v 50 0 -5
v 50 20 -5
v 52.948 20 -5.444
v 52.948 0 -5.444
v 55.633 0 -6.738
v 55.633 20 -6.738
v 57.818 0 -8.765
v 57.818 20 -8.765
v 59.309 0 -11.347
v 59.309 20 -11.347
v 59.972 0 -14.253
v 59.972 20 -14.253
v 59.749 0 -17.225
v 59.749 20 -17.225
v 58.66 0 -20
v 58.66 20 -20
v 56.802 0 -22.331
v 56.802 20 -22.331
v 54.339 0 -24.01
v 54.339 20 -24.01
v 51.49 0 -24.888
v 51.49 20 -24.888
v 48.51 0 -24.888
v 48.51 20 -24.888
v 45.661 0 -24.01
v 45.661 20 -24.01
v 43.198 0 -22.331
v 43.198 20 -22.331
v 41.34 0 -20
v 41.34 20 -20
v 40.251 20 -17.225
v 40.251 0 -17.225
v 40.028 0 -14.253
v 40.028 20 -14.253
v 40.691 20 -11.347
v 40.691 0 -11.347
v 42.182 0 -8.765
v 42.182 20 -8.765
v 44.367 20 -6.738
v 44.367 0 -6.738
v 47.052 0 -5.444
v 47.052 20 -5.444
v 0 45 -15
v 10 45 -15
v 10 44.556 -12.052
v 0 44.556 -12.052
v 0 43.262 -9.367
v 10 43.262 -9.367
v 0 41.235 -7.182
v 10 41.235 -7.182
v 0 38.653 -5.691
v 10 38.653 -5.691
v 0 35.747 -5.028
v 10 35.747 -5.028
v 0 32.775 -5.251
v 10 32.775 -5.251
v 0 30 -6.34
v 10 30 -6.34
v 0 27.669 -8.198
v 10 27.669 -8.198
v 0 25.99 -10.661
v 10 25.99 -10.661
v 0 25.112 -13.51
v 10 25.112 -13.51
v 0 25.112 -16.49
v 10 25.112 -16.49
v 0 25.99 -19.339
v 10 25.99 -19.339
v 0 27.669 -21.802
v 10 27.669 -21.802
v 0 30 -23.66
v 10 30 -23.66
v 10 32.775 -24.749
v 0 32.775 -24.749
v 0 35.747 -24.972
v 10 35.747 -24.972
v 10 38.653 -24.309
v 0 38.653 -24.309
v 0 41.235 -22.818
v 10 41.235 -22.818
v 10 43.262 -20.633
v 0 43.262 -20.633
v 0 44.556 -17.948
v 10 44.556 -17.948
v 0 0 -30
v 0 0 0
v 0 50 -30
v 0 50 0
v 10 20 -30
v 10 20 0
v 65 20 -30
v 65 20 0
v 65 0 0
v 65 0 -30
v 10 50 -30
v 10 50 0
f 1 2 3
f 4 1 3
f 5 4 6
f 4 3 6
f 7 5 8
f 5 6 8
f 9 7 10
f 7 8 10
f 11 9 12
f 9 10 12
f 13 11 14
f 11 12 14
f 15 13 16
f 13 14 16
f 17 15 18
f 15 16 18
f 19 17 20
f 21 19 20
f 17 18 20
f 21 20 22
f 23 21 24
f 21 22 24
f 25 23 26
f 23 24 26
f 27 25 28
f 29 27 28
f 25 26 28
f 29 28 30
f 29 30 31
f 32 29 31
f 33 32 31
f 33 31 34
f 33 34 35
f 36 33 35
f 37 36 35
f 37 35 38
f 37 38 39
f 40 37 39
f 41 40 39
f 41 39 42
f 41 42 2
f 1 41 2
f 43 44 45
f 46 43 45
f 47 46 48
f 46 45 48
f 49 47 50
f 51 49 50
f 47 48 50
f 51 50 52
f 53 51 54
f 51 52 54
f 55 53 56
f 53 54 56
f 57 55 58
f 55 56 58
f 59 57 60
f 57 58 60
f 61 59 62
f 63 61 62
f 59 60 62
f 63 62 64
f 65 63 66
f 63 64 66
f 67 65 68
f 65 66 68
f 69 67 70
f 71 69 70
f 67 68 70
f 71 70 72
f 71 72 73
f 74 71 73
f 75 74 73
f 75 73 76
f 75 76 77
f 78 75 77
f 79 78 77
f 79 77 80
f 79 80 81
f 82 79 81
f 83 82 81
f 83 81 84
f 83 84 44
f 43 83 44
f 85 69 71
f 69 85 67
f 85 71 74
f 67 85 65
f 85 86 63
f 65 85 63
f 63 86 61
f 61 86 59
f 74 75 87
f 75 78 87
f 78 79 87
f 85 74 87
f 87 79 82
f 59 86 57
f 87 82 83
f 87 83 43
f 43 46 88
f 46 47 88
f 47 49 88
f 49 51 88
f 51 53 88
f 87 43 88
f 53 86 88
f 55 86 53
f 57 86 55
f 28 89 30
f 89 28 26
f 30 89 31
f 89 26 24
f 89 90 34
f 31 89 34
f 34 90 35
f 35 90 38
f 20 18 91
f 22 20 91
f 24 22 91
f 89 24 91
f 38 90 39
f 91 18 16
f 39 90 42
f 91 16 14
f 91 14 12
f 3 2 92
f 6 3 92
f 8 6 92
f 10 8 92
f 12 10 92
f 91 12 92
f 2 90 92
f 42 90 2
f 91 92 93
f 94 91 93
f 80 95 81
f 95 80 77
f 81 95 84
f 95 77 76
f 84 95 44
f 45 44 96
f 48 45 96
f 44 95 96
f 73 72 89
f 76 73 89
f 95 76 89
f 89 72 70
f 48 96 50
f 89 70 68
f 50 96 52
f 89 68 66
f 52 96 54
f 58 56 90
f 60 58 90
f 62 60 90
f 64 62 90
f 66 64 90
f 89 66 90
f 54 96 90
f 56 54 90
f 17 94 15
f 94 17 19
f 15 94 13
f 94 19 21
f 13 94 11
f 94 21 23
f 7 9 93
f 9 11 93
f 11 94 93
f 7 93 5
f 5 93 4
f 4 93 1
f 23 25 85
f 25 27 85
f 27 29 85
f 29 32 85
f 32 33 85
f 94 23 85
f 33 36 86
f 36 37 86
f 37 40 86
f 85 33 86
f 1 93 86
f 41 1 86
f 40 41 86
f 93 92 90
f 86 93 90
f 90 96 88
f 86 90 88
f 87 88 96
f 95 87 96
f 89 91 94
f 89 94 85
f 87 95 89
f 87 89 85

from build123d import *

# Parameters (mm, degrees)
BOSS_EXTRUDE3_DEPTH = 30
SKETCH6_R           = 10
CUT_EXTRUDE2_DEPTH  = 30
SKETCH7_R           = 10
CUT_EXTRUDE3_DEPTH  = 30


with BuildPart() as part:
    # Sketch5 → Boss-Extrude3 (new body)
    with BuildSketch(Plane.XY):
        Polygon((0, 0), (0, 50), (10, 50), (10, 20), (65, 20), (65, 0), align=None)
    extrude(amount=-BOSS_EXTRUDE3_DEPTH)

    # Sketch6 → Cut-Extrude2 (cut)
    with BuildSketch(Plane(origin=(0, 20, 0), x_dir=(1, 0, 0), z_dir=(0, 1, 0))):
        with Locations(Location((50, 15, 0), (0, 0, 270))):
            Circle(SKETCH6_R)
    extrude(amount=-CUT_EXTRUDE2_DEPTH, mode=Mode.SUBTRACT)

    # Sketch7 → Cut-Extrude3 (cut)
    with BuildSketch(Plane(origin=(10, 0, 0), x_dir=(0, 0, -1), z_dir=(1, 0, 0))):
        with Locations(Location((15, 35, 0), (0, 0, 90))):
            Circle(SKETCH7_R)
    extrude(amount=-CUT_EXTRUDE3_DEPTH, mode=Mode.SUBTRACT)


solid = part.part
